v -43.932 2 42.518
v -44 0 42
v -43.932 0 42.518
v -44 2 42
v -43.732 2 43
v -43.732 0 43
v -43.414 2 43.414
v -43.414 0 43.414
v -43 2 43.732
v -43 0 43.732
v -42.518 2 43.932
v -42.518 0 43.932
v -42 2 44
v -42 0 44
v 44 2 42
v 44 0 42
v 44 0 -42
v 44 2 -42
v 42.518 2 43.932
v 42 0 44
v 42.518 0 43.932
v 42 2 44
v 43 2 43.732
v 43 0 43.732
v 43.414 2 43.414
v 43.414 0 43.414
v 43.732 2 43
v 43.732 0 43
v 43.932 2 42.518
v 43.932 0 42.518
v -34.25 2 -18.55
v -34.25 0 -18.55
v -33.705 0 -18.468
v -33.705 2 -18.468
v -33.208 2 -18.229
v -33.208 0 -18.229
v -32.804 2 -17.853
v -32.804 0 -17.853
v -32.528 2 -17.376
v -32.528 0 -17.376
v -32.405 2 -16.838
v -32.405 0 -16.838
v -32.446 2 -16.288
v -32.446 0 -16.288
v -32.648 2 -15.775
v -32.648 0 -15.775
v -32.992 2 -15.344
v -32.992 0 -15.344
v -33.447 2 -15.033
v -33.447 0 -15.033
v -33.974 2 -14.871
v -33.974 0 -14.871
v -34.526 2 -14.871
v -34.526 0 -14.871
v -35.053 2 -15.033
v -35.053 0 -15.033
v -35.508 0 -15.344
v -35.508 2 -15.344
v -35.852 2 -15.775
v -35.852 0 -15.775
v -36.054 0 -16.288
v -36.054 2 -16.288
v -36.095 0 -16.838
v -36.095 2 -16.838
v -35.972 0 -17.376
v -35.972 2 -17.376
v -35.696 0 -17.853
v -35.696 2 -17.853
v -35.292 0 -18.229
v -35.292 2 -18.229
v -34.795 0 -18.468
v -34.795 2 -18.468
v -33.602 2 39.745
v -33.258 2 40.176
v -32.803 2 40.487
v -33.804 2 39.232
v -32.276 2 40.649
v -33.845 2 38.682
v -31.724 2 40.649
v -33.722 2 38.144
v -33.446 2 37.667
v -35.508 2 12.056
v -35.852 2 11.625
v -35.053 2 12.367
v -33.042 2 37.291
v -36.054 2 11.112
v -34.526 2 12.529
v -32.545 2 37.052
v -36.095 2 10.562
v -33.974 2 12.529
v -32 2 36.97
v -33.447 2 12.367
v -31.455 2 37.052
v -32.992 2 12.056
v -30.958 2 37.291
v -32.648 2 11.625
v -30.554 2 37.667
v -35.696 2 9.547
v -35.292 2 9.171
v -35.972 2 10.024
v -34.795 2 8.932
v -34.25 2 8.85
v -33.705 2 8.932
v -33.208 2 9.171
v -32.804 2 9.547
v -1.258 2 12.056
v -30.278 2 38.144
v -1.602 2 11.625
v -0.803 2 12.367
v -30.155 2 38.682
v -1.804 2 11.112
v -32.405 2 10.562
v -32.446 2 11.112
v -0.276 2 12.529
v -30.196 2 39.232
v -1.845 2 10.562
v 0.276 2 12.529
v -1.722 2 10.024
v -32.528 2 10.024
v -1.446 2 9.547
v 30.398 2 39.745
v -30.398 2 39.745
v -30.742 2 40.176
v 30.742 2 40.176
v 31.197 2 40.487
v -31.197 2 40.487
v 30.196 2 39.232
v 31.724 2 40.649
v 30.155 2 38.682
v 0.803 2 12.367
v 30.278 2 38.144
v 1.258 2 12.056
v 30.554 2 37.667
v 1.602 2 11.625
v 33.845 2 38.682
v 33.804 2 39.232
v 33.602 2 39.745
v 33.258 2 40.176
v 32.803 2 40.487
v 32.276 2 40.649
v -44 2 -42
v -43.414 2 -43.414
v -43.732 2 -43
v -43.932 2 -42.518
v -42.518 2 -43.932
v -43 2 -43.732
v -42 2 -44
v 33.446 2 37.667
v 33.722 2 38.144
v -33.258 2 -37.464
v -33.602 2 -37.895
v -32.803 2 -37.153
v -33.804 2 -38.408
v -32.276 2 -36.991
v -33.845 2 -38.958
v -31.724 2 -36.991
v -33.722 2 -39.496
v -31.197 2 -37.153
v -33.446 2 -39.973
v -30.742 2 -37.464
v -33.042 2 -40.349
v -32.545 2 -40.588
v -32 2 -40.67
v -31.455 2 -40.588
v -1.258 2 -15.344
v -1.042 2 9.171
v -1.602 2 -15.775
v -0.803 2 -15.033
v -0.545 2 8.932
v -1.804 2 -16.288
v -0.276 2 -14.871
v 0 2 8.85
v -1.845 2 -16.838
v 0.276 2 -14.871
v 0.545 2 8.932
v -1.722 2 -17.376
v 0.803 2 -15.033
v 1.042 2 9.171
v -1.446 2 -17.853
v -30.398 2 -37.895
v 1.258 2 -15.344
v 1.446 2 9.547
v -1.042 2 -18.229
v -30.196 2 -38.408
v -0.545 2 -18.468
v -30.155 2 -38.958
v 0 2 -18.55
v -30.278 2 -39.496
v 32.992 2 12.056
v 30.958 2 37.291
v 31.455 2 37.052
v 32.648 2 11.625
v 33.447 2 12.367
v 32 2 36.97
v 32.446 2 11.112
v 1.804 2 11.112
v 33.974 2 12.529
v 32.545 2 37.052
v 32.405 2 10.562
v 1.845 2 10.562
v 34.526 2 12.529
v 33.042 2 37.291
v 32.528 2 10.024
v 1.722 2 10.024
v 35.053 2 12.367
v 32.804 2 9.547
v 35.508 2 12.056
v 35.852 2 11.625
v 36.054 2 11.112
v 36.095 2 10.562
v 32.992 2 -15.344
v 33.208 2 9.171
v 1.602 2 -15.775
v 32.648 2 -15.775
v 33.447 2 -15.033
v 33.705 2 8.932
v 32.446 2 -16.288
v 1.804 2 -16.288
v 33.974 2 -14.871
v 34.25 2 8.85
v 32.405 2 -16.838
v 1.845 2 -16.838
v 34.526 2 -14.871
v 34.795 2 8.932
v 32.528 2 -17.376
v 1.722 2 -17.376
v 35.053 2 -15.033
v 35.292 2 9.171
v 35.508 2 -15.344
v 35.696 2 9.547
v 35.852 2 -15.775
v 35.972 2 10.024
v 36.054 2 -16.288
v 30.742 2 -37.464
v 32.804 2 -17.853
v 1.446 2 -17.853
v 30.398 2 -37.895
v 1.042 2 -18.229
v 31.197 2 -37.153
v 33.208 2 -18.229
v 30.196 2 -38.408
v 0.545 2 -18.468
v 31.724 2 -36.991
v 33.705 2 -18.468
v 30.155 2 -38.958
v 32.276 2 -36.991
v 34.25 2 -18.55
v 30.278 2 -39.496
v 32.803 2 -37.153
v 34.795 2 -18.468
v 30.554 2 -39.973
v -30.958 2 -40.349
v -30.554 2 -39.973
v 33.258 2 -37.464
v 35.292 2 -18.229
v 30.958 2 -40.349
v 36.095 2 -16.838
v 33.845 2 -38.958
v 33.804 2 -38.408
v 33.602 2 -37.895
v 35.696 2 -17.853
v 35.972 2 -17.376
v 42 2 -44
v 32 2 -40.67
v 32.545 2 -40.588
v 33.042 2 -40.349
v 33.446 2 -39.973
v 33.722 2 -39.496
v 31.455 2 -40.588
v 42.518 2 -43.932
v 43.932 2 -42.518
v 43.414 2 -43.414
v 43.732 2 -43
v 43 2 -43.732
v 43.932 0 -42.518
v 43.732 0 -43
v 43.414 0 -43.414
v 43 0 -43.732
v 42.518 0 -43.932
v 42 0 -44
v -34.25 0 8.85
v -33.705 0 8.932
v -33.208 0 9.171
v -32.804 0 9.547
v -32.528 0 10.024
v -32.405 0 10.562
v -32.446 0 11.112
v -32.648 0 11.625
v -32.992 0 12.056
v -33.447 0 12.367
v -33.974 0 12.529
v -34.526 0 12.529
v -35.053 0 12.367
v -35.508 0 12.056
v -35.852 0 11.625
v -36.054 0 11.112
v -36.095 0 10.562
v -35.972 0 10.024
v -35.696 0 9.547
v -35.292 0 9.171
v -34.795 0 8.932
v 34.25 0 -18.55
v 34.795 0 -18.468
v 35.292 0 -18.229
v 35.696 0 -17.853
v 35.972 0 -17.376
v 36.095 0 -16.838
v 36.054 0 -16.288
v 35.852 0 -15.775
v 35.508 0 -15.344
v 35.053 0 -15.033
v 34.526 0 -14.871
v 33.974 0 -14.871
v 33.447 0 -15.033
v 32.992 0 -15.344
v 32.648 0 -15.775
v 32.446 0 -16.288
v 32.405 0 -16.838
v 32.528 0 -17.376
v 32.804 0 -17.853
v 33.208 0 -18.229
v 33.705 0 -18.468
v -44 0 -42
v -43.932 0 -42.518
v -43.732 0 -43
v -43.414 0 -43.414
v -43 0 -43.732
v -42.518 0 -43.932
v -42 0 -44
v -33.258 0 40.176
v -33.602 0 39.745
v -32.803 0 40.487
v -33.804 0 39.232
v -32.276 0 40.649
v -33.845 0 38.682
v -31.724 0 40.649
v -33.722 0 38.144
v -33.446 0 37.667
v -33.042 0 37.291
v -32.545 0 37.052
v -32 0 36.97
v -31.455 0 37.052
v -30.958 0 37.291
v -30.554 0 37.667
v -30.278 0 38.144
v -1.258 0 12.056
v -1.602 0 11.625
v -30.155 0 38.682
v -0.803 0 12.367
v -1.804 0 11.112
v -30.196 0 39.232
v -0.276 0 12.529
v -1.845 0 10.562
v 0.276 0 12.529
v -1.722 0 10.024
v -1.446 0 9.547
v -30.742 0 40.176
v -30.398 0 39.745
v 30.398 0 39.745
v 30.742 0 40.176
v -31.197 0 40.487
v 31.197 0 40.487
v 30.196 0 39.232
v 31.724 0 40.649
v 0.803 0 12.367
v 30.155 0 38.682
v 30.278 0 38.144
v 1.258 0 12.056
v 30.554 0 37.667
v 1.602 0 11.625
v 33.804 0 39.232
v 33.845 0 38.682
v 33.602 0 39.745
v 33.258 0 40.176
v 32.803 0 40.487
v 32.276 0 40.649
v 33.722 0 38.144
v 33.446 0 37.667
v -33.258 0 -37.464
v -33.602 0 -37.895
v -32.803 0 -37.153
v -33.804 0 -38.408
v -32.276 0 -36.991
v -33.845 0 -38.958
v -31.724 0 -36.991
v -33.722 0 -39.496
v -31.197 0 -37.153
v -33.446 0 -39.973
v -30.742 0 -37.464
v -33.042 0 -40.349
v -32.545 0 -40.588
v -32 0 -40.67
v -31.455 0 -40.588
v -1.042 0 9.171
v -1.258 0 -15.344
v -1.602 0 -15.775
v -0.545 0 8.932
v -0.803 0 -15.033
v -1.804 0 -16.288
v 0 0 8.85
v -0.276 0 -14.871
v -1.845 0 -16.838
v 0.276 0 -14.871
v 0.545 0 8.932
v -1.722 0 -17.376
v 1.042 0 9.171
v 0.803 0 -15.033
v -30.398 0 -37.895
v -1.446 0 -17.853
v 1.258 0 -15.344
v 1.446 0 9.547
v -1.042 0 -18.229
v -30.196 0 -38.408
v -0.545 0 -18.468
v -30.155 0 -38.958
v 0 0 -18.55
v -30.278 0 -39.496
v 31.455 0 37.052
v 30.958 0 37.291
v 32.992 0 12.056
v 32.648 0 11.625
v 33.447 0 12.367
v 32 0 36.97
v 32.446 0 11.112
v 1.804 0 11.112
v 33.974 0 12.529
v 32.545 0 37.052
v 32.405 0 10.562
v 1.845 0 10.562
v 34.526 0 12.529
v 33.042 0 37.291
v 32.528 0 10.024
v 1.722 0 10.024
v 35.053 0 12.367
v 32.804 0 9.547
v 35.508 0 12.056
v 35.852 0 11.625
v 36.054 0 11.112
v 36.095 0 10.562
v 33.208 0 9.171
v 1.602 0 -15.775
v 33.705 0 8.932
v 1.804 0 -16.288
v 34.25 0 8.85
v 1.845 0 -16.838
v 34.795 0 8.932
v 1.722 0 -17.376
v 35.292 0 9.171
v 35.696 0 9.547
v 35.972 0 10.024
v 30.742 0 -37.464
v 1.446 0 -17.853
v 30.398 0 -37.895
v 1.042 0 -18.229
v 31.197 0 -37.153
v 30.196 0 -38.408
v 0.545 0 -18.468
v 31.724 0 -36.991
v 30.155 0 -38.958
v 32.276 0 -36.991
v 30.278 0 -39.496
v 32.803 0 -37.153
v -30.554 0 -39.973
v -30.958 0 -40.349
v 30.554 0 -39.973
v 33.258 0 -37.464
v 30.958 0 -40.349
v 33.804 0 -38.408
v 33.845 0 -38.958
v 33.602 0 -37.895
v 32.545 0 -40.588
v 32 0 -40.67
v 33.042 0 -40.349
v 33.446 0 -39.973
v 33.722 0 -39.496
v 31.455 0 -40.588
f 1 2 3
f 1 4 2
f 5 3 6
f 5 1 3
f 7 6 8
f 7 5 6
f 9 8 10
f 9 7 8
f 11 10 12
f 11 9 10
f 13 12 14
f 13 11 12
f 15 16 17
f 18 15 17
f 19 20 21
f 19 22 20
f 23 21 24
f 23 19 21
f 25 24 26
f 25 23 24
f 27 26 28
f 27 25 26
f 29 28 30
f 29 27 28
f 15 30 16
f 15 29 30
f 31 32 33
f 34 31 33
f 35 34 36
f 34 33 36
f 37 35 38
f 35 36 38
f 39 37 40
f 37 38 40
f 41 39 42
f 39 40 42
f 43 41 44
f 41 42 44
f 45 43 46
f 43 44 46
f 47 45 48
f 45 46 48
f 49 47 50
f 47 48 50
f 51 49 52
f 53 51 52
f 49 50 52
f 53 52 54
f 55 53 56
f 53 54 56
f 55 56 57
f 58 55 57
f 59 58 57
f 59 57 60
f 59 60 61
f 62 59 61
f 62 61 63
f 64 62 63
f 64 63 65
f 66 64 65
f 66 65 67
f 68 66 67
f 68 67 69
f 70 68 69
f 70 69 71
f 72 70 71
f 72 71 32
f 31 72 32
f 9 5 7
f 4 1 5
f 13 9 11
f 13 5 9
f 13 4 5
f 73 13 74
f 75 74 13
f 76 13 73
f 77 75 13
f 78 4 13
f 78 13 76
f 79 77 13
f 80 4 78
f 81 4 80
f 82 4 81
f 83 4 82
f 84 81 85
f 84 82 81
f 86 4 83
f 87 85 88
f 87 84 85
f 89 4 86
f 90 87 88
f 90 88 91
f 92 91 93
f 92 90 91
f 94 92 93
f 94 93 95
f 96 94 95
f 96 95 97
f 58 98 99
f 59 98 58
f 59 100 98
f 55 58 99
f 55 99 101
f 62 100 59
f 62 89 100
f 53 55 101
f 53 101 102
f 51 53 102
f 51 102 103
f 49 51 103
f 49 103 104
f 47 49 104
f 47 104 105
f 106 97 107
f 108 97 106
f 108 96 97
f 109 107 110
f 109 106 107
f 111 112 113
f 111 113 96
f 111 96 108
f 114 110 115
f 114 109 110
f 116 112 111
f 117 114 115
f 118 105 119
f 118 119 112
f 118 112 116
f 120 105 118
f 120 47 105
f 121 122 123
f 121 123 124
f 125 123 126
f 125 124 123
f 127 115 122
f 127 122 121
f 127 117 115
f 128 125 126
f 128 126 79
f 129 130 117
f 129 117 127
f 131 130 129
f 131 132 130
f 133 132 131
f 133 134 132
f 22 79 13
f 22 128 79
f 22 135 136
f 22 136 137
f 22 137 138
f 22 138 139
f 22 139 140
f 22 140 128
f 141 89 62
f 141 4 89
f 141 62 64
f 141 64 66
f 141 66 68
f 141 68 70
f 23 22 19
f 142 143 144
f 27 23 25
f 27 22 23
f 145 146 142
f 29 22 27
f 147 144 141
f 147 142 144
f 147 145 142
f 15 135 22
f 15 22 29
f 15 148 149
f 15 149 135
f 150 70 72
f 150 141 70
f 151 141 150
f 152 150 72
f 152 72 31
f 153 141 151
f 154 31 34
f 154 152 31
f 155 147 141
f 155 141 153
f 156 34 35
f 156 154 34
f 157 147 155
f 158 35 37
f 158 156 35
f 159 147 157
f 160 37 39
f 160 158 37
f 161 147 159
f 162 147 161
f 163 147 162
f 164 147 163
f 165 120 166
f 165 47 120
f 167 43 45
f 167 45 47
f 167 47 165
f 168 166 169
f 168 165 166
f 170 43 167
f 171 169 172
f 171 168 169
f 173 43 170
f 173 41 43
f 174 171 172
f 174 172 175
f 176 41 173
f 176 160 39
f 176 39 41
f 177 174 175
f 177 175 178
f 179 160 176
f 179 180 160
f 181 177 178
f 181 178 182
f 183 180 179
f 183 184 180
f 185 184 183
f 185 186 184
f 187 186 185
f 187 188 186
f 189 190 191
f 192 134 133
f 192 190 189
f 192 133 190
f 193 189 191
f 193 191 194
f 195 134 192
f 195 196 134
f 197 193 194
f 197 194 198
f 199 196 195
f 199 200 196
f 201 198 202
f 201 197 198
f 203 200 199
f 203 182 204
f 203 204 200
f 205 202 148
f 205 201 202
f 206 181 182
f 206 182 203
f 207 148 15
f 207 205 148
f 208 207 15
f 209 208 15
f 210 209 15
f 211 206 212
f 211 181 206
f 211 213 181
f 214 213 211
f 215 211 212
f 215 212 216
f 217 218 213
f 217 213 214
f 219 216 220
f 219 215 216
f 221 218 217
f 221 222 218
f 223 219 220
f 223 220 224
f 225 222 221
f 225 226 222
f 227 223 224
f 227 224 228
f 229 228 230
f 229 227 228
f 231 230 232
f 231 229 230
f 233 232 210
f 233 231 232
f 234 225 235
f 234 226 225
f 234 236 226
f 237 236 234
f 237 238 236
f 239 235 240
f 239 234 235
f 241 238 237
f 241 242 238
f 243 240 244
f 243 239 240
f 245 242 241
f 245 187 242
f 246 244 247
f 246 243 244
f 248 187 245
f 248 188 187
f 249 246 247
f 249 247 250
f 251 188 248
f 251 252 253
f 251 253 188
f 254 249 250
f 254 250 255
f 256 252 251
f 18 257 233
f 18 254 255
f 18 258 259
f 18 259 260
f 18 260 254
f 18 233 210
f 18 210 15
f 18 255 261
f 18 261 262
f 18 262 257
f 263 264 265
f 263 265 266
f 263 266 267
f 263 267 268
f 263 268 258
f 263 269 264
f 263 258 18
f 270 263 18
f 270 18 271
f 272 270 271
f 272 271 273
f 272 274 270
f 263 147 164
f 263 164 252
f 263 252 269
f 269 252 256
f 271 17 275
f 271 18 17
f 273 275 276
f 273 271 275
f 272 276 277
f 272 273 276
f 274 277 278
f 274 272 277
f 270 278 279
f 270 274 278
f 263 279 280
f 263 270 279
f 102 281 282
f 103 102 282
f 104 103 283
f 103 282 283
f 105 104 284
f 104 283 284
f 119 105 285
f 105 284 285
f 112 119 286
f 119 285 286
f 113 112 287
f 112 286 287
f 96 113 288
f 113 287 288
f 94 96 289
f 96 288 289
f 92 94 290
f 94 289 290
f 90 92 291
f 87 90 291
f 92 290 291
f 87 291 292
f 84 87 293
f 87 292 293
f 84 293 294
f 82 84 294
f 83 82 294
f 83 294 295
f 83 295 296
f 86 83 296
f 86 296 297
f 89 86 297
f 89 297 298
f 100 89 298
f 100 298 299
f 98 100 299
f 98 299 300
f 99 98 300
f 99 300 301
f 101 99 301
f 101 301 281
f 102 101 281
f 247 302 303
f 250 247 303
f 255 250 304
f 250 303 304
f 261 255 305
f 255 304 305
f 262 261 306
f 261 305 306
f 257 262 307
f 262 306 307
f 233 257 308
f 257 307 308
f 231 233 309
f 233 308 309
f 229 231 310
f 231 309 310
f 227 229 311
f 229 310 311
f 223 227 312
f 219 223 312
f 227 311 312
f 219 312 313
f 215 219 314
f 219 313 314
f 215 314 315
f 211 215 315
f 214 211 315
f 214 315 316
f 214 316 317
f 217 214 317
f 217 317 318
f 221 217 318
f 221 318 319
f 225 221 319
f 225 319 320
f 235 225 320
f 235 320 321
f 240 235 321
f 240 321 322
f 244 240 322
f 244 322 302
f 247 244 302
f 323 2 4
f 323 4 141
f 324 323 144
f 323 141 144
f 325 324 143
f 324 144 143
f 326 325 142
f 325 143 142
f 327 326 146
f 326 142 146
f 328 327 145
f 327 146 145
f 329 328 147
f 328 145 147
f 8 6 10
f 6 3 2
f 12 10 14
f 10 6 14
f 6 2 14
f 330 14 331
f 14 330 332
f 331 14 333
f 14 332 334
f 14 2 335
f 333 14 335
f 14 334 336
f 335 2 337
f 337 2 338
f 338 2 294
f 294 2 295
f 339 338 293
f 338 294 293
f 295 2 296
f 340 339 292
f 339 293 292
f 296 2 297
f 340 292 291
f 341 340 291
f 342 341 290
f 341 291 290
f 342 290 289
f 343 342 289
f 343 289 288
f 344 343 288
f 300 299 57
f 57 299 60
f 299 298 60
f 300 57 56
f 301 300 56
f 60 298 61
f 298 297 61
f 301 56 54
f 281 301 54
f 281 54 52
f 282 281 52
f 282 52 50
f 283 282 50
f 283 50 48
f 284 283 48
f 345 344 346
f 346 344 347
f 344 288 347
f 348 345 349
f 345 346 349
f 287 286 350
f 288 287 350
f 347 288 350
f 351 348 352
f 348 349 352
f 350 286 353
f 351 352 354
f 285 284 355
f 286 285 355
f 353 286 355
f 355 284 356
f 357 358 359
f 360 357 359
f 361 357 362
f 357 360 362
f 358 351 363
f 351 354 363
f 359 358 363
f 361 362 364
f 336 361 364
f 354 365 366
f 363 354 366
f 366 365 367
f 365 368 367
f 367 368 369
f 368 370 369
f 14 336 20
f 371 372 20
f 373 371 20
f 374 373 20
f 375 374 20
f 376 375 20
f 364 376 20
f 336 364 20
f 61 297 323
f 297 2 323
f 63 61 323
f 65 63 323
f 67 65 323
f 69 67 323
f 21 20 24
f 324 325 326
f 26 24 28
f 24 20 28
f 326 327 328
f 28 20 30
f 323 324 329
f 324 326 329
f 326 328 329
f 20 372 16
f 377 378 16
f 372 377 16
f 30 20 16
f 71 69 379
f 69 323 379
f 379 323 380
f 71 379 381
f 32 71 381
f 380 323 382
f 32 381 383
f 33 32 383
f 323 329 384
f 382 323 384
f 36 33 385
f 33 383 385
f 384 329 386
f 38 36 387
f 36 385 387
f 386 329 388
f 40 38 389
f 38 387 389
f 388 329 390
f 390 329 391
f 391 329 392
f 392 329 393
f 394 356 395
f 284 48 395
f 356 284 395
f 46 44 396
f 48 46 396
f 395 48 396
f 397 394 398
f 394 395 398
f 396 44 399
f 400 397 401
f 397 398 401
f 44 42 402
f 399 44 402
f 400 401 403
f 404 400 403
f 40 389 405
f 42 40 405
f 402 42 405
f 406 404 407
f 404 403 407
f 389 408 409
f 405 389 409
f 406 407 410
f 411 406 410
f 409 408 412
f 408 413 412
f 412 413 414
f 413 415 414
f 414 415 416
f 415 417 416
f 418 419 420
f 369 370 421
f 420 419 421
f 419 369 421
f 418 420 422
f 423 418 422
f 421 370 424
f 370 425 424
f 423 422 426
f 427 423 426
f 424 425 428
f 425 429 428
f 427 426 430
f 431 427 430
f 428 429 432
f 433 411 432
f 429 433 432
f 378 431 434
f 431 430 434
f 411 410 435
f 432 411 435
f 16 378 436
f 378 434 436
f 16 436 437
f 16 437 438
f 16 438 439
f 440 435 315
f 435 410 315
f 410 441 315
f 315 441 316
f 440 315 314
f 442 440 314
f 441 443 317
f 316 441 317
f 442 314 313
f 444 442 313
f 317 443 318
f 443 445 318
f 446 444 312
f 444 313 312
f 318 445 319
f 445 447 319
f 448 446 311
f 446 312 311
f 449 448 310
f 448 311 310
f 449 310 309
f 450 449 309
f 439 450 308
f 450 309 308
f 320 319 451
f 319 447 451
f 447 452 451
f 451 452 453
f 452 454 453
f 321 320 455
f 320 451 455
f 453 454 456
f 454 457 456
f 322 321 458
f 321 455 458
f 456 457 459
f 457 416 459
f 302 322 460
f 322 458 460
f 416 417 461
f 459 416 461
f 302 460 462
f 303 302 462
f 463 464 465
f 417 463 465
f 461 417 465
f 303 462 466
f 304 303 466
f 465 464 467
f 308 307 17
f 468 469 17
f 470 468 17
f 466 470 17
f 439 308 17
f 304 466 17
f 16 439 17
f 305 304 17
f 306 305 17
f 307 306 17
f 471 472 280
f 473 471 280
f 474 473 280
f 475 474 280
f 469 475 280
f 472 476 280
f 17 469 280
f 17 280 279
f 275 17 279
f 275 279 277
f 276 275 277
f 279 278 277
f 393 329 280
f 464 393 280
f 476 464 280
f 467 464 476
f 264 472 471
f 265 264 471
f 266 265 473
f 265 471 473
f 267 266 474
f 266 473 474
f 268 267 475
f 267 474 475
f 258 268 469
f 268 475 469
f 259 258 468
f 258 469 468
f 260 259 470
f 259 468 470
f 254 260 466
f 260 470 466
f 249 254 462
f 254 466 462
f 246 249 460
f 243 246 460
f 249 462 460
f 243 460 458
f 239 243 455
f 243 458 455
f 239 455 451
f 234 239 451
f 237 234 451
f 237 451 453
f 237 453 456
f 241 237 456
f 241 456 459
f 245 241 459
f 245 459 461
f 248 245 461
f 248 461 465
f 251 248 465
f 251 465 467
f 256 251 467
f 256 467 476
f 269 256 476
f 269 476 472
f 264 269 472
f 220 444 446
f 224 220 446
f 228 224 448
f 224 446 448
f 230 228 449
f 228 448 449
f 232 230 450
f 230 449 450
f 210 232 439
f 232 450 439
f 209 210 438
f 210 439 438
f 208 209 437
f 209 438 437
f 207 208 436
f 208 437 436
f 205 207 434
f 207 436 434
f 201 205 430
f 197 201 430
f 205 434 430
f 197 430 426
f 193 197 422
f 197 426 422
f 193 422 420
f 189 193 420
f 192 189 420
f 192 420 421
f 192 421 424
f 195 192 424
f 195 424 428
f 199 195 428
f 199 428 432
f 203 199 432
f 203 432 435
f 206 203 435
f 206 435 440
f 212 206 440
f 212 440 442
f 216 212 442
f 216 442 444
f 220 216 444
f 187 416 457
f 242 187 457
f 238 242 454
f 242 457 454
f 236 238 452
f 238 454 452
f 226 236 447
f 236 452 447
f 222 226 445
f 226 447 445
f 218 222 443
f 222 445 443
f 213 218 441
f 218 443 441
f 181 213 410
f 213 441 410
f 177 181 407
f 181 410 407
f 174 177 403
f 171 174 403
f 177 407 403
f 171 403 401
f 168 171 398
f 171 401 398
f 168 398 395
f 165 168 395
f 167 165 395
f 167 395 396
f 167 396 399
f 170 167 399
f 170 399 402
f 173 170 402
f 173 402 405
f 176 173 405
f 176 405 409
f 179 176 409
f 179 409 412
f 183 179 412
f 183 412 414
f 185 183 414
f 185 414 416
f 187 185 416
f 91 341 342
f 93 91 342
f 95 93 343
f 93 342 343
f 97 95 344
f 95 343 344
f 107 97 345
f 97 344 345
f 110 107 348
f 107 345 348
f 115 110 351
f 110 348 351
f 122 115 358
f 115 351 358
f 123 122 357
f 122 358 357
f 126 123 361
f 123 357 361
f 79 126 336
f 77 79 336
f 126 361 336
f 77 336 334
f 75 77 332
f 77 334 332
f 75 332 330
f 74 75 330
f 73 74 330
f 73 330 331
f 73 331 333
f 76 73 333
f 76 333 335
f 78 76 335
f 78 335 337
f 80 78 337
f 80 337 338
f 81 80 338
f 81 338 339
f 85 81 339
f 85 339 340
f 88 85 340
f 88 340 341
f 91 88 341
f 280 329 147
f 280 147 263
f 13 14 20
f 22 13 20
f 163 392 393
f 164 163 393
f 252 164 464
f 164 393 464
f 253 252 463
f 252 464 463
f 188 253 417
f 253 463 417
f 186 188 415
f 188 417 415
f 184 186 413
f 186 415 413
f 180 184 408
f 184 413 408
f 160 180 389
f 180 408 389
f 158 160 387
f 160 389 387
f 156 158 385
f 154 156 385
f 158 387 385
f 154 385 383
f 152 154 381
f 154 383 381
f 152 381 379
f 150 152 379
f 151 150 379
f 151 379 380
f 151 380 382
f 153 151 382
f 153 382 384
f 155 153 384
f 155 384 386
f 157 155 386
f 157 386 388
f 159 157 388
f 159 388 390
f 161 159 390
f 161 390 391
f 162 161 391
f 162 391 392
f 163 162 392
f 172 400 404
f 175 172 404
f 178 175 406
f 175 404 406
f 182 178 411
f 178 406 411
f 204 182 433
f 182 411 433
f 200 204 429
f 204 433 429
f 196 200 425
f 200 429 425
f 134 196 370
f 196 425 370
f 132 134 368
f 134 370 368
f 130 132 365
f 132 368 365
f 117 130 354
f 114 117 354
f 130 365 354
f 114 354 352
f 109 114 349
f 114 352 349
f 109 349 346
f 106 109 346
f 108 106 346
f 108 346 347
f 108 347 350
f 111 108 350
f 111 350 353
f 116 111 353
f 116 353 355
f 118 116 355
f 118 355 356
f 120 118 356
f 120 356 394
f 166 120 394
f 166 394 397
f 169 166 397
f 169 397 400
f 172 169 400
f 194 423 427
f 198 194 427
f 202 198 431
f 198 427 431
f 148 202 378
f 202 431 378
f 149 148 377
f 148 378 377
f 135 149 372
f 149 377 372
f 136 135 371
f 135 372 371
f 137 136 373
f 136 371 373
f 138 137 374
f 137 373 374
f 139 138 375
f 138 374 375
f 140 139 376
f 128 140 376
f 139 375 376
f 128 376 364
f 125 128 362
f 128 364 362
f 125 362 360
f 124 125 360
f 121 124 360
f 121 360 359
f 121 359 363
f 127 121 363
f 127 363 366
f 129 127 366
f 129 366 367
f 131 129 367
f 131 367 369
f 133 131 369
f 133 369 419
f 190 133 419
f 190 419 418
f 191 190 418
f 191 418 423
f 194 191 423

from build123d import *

# Parameters (mm, degrees)
SKETCH1_W           = 88
SKETCH1_H           = 88
BOSS_EXTRUDE1_DEPTH = 2
FILLET1_R           = 2
SKETCH2_R           = 1.85
CUT_EXTRUDE1_DEPTH  = 10
SKETCH3_R           = 1.85
CUT_EXTRUDE2_DEPTH  = 5


with BuildPart() as part:
    # Sketch1 → Boss-Extrude1 (new body)
    with BuildSketch(Plane(origin=(0, 0, 0), x_dir=(1, 0, 0), z_dir=(0, 1, 0))):
        Rectangle(SKETCH1_W, SKETCH1_H)
    extrude(amount=BOSS_EXTRUDE1_DEPTH)

    # Fillet1
    fillet1_edges = [part.edges().sort_by_distance(p)[0] for p in [
        (-44, 1, -44),
        (44, 1, -44),
        (44, 1, 44),
        (-44, 1, 44),
    ]]
    fillet(fillet1_edges, radius=FILLET1_R)

    # Sketch2 → Cut-Extrude1 (cut)
    with BuildSketch(Plane.XZ):
        with Locations(Location((-32, 38.82, 0), (0, 0, 270))):
            Circle(SKETCH2_R)
        with Locations(Location((32, 38.82, 0), (0, 0, 270))):
            Circle(SKETCH2_R)
        with Locations(Location((32, -38.82, 0), (0, 0, 270))):
            Circle(SKETCH2_R)
        with Locations(Location((-32, -38.82, 0), (0, 0, 270))):
            Circle(SKETCH2_R)
    extrude(amount=-CUT_EXTRUDE1_DEPTH, mode=Mode.SUBTRACT)

    # Sketch3 → Cut-Extrude2 (cut)
    with BuildSketch(Plane.XZ):
        with Locations(Location((-34.25, 10.7, 0), (0, 0, 270))):
            Circle(SKETCH3_R)
        with Locations(Location((0, 10.7, 0), (0, 0, 270))):
            Circle(SKETCH3_R)
        with Locations(Location((34.25, 10.7, 0), (0, 0, 270))):
            Circle(SKETCH3_R)
        with Locations(Location((34.25, -16.7, 0), (0, 0, 270))):
            Circle(SKETCH3_R)
        with Locations(Location((0, -16.7, 0), (0, 0, 270))):
            Circle(SKETCH3_R)
        with Locations(Location((-34.25, -16.7, 0), (0, 0, 270))):
            Circle(SKETCH3_R)
    extrude(amount=-CUT_EXTRUDE2_DEPTH, mode=Mode.SUBTRACT)


solid = part.part
